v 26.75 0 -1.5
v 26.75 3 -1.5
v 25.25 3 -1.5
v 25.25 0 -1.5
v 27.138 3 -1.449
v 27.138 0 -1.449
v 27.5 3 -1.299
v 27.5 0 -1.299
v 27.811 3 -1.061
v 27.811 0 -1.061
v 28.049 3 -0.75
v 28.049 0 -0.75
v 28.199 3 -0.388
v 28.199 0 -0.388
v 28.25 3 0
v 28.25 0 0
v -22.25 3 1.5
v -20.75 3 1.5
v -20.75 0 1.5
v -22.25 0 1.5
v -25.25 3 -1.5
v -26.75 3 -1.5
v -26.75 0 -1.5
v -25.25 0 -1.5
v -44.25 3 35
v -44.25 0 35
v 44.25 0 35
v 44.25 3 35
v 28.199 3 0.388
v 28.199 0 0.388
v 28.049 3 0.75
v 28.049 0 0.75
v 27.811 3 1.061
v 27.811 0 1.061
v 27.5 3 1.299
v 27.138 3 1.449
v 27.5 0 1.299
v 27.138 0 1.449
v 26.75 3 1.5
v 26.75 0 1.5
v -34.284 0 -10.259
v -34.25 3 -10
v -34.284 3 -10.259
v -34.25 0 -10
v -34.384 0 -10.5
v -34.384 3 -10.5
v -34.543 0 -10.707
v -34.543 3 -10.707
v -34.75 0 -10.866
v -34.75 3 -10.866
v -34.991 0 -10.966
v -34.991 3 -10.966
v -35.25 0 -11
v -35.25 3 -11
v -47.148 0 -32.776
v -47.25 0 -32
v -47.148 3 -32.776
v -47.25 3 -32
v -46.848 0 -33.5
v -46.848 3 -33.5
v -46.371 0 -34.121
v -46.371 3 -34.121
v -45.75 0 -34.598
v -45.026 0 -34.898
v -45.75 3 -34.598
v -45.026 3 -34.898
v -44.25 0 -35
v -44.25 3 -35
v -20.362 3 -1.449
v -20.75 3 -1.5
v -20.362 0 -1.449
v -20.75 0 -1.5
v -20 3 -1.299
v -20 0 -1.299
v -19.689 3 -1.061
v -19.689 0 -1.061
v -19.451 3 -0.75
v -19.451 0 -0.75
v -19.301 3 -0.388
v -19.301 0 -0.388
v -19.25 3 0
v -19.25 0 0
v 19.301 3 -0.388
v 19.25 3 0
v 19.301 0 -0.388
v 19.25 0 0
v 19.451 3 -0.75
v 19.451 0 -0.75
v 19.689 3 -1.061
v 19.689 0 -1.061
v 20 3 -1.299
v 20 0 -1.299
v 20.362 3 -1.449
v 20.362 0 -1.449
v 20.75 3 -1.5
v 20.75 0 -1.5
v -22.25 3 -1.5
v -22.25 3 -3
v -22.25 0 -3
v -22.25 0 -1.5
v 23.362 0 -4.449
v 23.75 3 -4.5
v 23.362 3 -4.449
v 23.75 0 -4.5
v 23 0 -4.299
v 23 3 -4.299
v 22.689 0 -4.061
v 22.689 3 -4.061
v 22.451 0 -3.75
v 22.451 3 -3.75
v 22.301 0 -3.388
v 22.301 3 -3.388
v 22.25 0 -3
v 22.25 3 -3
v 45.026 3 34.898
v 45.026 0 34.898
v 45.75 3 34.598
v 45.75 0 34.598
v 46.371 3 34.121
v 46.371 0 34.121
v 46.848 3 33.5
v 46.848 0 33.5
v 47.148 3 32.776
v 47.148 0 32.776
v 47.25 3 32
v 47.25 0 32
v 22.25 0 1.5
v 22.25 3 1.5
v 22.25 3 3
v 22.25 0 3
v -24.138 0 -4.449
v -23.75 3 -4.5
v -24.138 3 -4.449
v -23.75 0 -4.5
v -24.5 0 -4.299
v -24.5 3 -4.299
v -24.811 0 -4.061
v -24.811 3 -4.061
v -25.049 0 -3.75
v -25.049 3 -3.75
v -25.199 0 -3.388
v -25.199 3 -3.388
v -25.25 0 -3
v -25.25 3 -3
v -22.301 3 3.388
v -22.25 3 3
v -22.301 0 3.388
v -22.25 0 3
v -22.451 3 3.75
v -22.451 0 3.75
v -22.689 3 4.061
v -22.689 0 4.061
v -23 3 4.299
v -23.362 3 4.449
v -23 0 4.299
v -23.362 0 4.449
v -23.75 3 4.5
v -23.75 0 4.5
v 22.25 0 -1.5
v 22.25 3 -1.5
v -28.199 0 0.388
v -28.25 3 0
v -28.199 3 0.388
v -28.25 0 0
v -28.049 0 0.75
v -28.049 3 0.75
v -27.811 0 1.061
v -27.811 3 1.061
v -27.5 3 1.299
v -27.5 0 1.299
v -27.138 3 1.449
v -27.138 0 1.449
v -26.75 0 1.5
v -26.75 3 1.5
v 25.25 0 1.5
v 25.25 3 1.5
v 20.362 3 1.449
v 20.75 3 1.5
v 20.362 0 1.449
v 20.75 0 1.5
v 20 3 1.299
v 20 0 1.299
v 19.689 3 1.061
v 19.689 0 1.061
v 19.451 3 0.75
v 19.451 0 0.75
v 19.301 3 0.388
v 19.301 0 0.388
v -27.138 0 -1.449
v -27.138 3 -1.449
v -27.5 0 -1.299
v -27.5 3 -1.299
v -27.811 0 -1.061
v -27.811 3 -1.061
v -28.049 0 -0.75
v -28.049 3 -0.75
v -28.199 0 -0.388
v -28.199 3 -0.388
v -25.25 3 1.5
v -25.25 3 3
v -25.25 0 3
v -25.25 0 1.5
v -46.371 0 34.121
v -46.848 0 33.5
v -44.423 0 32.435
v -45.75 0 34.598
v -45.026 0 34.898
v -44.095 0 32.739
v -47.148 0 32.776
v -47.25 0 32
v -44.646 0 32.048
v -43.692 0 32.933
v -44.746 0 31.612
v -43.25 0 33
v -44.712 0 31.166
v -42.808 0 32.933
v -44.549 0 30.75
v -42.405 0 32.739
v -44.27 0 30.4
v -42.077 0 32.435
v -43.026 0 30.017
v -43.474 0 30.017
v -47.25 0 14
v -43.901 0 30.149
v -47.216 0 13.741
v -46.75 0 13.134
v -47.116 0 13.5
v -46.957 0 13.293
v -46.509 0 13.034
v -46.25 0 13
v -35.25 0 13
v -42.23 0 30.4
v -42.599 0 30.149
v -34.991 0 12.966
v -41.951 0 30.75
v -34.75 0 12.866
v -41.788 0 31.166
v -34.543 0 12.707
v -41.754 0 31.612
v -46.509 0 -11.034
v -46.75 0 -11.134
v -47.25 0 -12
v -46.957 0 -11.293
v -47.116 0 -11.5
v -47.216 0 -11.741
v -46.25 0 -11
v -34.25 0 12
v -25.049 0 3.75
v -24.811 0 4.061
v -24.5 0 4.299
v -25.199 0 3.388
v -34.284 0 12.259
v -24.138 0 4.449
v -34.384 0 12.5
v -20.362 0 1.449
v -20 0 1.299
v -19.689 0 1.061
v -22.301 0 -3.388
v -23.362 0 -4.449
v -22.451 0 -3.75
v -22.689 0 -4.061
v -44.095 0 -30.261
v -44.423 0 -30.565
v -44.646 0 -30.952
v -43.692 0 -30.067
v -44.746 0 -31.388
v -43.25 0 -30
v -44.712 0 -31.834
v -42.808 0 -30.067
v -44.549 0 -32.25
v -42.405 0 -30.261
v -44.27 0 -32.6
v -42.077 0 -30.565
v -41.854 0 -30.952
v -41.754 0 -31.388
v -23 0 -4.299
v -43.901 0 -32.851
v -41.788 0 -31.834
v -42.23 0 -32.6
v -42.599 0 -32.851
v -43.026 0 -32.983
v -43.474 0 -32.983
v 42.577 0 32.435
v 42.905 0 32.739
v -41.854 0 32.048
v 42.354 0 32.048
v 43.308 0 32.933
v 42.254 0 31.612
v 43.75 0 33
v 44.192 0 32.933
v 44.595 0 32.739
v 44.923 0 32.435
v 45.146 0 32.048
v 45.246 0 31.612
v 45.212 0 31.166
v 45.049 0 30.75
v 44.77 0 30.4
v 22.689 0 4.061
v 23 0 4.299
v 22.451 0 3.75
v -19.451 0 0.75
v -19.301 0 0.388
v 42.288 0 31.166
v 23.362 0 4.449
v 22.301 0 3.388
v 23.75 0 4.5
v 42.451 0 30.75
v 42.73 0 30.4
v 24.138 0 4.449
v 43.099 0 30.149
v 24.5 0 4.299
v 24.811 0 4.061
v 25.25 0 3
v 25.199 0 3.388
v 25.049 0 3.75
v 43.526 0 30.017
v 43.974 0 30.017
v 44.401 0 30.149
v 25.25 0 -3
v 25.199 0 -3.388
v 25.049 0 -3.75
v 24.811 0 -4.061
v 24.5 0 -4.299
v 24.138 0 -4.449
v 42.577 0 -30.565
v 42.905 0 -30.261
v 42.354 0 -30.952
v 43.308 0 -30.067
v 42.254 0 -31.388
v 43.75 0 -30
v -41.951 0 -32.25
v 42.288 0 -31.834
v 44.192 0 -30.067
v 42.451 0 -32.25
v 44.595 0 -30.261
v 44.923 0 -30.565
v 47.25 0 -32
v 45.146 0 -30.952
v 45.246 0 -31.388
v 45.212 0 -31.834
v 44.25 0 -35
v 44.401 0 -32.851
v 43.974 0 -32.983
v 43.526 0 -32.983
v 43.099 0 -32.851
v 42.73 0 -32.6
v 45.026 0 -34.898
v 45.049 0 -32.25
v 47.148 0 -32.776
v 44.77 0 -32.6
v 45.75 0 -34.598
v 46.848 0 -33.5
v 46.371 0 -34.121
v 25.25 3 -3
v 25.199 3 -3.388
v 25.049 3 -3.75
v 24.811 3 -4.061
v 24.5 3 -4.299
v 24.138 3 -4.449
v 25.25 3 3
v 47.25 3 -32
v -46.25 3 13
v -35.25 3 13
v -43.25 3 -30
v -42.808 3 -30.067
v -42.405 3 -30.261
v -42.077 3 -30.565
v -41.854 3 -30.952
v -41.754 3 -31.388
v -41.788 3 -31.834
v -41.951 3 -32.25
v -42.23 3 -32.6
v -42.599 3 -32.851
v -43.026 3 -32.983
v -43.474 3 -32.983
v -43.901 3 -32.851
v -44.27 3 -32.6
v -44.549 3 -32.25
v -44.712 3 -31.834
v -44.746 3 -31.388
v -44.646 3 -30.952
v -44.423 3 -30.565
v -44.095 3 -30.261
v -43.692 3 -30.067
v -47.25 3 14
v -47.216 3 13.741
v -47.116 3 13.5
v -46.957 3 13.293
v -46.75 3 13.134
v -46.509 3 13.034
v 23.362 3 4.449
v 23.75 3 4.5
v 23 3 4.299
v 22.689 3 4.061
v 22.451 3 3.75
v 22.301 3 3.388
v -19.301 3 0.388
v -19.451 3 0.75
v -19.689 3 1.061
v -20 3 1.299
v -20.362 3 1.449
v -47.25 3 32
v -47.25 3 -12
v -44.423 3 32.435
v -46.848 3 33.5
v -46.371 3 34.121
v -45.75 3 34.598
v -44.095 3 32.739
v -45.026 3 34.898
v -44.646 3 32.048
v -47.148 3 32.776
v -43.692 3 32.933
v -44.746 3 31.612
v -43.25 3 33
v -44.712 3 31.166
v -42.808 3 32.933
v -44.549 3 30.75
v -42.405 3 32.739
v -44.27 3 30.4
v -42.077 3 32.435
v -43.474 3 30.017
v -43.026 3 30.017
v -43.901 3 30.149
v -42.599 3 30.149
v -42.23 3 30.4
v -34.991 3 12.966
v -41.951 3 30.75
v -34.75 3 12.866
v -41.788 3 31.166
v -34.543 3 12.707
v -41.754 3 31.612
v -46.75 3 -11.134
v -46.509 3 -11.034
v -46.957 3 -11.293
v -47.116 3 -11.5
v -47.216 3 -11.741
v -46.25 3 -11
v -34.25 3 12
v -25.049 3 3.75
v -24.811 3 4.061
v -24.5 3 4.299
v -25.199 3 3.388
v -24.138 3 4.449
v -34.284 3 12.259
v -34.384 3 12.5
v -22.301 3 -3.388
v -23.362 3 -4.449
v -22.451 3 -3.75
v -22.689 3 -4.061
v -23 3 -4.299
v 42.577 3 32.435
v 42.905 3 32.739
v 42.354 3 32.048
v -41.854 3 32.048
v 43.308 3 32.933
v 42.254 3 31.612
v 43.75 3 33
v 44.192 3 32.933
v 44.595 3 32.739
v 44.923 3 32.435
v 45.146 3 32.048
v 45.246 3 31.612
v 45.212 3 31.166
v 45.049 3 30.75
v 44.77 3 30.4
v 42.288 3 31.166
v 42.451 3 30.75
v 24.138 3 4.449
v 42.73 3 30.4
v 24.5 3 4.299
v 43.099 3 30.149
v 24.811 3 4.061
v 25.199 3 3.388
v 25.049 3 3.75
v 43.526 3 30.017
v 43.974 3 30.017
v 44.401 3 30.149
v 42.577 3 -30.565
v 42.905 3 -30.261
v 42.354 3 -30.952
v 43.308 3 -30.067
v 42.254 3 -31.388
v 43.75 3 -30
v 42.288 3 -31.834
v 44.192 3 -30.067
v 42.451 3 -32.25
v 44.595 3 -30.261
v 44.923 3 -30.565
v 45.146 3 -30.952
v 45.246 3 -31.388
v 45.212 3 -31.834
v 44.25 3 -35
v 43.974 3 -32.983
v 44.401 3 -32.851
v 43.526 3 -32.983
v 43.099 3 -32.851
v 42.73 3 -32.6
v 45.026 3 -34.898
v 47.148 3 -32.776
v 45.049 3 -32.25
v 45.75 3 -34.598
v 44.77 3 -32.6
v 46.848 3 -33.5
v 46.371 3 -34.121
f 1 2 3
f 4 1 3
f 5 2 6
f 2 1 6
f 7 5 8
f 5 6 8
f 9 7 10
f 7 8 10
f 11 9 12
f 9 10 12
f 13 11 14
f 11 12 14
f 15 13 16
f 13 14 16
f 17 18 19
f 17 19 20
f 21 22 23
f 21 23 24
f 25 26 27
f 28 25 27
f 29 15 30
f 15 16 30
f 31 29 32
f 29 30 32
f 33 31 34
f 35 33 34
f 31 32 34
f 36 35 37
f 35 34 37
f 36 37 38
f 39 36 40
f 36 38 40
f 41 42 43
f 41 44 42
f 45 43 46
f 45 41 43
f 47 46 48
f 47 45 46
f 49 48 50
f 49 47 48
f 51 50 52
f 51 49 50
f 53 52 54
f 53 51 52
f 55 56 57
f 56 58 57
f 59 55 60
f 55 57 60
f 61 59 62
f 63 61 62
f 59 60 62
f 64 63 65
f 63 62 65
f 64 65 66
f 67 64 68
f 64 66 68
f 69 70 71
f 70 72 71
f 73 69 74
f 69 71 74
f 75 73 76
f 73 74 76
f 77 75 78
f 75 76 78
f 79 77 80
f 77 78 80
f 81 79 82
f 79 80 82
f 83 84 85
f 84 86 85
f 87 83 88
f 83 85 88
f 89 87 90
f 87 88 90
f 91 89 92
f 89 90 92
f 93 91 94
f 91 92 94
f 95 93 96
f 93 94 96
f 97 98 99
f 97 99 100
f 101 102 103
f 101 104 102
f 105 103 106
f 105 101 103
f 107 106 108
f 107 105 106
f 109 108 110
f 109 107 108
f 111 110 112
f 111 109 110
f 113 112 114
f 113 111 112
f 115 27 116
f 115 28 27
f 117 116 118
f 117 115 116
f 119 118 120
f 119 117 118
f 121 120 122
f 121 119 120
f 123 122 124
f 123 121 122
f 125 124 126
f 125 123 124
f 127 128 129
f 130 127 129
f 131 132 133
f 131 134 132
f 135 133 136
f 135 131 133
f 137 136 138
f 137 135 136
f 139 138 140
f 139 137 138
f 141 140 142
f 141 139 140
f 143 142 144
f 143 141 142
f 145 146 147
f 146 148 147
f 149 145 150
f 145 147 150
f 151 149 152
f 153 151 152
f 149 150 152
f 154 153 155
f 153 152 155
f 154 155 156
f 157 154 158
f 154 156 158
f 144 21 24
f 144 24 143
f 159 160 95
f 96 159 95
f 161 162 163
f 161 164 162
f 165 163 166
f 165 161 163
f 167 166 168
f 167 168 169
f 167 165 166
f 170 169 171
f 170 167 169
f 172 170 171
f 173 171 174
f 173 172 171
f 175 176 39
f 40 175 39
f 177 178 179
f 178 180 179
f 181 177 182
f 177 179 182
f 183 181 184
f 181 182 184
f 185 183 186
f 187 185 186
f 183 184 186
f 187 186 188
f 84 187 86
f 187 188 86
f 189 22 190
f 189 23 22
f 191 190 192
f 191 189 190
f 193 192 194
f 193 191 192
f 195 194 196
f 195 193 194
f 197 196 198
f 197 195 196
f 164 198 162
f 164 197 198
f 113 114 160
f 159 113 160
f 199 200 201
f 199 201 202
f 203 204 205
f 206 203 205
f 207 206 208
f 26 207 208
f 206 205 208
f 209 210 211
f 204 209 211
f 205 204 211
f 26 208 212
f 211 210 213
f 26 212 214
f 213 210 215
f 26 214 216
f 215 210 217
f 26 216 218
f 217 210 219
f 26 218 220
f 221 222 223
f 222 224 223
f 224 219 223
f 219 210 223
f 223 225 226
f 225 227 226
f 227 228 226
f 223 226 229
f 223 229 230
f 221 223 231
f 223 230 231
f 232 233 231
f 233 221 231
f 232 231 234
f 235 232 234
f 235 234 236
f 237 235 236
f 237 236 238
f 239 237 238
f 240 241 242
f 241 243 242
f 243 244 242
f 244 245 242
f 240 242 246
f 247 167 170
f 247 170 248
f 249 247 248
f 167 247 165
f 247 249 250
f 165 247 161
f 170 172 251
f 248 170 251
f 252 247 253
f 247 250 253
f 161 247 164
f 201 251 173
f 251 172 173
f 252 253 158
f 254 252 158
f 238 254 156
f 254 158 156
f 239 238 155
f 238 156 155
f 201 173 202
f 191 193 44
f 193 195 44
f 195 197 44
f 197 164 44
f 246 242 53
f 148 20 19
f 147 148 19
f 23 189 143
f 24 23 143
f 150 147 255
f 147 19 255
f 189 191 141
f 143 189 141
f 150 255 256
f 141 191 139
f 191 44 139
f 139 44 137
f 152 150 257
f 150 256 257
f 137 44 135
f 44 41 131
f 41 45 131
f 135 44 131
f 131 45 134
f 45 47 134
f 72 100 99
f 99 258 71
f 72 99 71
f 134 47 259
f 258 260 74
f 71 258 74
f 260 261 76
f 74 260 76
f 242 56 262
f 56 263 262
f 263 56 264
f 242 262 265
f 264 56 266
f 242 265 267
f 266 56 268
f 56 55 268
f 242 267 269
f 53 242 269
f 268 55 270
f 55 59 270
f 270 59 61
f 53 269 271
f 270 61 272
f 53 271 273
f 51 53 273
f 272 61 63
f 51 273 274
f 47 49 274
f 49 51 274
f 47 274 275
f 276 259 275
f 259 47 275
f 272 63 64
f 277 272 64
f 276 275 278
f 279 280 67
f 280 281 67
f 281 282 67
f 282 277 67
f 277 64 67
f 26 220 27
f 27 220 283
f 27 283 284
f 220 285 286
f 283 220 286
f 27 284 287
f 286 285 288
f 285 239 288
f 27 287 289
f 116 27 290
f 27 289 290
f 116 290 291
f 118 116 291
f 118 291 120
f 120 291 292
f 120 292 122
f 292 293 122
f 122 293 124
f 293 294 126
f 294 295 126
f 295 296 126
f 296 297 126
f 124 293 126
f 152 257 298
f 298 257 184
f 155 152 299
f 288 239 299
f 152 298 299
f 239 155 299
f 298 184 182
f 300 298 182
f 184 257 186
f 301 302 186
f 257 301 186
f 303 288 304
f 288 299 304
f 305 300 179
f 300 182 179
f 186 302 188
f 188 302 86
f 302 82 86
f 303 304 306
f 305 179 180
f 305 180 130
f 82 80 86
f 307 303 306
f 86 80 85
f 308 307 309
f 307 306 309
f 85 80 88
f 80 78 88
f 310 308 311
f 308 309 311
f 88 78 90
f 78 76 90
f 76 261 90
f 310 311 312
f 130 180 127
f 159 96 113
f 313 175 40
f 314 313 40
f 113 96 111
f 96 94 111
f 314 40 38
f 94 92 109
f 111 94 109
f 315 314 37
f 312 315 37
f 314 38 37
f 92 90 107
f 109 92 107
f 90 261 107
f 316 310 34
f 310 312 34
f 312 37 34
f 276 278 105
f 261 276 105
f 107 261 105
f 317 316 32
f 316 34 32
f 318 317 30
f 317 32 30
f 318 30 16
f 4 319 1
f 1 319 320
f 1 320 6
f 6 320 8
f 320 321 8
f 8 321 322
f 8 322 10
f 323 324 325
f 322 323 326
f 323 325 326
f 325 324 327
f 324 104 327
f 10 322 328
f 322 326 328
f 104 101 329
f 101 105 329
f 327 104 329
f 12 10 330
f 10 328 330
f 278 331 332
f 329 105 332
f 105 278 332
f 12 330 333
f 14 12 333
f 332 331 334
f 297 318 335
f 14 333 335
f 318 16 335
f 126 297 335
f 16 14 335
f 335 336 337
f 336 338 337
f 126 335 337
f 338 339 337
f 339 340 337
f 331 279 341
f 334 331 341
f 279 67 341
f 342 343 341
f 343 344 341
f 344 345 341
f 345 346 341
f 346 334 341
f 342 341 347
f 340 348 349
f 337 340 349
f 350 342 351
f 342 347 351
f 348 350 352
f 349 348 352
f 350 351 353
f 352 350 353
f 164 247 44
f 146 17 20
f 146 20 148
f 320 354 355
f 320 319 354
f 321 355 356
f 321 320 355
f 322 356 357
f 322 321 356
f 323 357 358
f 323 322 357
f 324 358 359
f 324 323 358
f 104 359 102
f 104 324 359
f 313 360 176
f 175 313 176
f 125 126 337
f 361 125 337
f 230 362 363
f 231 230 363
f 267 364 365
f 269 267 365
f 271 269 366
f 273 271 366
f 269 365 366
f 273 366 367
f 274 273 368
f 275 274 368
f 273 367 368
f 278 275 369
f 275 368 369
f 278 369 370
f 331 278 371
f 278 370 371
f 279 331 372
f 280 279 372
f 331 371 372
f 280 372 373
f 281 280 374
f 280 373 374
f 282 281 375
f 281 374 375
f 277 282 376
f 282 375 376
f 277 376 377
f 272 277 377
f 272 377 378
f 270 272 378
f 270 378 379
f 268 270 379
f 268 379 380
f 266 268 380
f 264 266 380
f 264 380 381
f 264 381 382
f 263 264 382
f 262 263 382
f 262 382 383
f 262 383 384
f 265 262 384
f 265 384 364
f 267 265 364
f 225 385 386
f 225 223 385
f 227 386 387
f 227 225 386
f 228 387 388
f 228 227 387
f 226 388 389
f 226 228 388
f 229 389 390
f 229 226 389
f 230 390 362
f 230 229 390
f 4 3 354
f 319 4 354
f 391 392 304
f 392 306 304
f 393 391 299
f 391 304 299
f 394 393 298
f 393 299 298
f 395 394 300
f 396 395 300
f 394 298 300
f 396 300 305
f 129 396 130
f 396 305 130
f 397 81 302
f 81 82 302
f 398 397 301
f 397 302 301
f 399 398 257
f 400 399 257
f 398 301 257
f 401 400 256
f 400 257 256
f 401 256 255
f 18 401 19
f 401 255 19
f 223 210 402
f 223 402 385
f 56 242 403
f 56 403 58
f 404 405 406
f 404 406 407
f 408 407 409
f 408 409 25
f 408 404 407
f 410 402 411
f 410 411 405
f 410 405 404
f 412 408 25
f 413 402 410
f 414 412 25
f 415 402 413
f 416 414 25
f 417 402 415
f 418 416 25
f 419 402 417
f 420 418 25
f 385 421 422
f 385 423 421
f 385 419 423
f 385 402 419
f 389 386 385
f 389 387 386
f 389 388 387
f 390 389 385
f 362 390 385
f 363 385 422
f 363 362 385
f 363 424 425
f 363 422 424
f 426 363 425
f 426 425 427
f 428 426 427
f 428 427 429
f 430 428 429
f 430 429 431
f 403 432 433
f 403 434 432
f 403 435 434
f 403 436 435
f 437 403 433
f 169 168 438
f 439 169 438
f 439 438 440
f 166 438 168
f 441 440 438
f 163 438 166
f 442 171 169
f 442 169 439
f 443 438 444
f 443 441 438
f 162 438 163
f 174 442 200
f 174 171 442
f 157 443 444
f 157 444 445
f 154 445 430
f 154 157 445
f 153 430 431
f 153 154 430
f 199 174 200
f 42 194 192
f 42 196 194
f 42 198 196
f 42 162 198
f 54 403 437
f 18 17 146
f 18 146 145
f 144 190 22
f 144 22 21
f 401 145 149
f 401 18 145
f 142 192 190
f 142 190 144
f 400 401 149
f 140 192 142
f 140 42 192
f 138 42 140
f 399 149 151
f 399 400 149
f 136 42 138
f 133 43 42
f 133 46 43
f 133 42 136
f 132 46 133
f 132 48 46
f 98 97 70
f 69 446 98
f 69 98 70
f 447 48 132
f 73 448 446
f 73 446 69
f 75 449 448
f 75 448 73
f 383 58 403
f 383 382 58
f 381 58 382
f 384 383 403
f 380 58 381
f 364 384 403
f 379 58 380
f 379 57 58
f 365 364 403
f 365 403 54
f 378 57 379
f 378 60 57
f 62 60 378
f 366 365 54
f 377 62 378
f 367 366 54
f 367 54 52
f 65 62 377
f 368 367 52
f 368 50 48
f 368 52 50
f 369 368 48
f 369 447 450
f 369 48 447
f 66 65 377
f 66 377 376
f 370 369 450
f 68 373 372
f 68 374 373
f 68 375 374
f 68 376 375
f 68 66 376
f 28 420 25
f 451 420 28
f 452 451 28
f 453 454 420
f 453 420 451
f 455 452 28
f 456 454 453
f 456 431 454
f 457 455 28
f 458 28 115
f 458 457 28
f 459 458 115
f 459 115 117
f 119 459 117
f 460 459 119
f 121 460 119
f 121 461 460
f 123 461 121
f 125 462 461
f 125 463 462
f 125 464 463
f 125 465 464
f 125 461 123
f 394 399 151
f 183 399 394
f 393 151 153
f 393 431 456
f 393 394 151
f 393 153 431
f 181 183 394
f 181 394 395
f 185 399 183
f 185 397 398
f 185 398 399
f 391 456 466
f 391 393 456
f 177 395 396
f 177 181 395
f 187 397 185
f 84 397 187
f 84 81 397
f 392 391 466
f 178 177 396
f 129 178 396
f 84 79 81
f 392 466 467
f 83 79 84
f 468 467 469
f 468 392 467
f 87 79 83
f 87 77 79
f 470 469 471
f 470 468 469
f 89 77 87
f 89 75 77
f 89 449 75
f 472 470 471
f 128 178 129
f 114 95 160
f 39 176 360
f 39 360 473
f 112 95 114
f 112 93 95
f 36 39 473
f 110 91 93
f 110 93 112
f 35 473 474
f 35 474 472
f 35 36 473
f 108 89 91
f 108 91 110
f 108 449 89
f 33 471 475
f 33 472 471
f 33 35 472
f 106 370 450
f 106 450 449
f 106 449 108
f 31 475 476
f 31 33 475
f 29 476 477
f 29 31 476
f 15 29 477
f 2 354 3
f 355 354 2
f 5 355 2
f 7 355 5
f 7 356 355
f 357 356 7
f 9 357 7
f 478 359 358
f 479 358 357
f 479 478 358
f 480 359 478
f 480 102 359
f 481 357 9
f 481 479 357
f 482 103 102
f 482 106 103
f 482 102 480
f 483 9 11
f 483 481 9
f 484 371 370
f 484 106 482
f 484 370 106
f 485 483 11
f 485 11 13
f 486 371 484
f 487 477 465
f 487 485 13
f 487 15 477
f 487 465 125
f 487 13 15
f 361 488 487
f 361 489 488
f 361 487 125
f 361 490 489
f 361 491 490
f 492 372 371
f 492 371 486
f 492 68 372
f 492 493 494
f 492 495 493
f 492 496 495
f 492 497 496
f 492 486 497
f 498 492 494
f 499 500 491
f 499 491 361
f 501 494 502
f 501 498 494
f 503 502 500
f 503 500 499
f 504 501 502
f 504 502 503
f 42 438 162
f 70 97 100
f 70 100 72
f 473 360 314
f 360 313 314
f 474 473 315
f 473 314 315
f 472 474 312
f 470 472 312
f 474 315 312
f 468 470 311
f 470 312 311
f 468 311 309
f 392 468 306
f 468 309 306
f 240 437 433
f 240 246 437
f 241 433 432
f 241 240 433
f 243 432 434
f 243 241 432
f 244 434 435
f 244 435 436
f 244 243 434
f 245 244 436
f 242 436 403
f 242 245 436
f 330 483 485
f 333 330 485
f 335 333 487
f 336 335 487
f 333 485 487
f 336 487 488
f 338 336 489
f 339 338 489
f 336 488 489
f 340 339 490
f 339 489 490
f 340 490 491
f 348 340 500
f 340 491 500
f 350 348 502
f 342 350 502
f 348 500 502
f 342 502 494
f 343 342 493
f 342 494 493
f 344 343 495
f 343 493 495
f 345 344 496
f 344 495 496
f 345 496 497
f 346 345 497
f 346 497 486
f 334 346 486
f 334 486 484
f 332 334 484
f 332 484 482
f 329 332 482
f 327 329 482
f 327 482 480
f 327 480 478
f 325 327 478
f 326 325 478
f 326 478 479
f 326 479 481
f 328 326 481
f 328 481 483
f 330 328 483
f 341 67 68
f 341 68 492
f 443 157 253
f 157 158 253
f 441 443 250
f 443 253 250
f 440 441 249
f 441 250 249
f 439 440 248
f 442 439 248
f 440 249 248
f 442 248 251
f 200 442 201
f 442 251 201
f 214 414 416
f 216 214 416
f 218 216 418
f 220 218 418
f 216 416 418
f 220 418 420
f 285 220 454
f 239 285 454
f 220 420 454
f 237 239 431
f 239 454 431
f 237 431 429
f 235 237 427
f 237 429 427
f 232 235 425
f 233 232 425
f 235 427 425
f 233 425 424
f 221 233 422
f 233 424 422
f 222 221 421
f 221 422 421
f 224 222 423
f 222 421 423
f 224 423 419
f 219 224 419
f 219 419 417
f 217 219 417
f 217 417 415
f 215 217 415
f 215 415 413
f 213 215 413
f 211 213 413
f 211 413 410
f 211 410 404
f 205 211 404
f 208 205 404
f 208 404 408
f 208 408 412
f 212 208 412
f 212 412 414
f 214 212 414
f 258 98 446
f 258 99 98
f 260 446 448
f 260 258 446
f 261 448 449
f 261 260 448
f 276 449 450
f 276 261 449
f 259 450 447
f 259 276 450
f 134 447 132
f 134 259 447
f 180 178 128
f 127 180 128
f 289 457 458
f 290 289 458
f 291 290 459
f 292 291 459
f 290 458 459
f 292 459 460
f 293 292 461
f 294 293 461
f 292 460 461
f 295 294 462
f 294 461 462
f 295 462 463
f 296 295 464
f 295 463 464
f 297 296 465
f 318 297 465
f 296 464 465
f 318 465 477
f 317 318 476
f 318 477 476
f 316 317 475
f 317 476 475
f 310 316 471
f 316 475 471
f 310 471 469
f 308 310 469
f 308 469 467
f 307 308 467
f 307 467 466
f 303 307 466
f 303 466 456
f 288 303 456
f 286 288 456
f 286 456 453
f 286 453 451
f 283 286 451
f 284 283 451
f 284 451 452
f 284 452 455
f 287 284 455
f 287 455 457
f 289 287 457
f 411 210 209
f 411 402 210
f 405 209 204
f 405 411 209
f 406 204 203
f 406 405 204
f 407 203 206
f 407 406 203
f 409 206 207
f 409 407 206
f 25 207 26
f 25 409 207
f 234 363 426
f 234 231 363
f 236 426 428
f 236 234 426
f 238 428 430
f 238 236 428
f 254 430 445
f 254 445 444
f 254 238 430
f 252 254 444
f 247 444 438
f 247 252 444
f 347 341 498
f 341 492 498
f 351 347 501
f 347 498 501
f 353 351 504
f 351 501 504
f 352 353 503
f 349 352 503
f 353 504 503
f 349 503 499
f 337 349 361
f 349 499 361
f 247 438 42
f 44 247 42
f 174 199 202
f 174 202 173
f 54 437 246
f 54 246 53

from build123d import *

# Parameters (mm, degrees)
SKETCH1_W           = 94.5
SKETCH1_H           = 70
BOSS_EXTRUDE1_DEPTH = 3
SKETCH3_R           = 1.5
CUT_EXTRUDE2_DEPTH  = 59.877521177
FILLET2_R           = 3
SKETCH5_W           = 13
SKETCH5_H           = 24
CUT_EXTRUDE3_DEPTH  = 59.877521177
FILLET3_R           = 1
FILLET5_R           = 1.5
FILLET6_R           = 1.5
FILLET7_R           = 1.5
FILLET8_R           = 1.5
FILLET9_R           = 1.5
FILLET10_R          = 1.5
FILLET11_R          = 1.5
FILLET12_R          = 1.5


with BuildPart() as part:
    # Sketch1 → Boss-Extrude1 (new body)
    with BuildSketch(Plane(origin=(0, 0, 0), x_dir=(1, 0, 0), z_dir=(0, 1, 0))):
        Rectangle(SKETCH1_W, SKETCH1_H)
    extrude(amount=BOSS_EXTRUDE1_DEPTH)

    # Sketch3 → Cut-Extrude2 (cut, through all)
    with BuildSketch(Plane(origin=(0, 3, 0), x_dir=(1, 0, 0), z_dir=(0, 1, 0))):
        with Locations(Location((43.75, 31.5, 0), (0, 0, 270))):
            Circle(SKETCH3_R)
        with Locations(Location((-43.25, 31.5, 0), (0, 0, 270))):
            Circle(SKETCH3_R)
        with Locations(Location((-43.25, -31.5, 0), (0, 0, 270))):
            Circle(SKETCH3_R)
        with Locations(Location((43.75, -31.5, 0), (0, 0, 270))):
            Circle(SKETCH3_R)
    extrude(amount=-CUT_EXTRUDE2_DEPTH, mode=Mode.SUBTRACT)

    # Fillet2
    fillet2_edges = [part.edges().sort_by_distance(p)[0] for p in [
        (47.25, 1.5, 35),
        (-47.25, 1.5, 35),
        (-47.25, 1.5, -35),
        (47.25, 1.5, -35),
    ]]
    fillet(fillet2_edges, radius=FILLET2_R)

    # Sketch5 → Cut-Extrude3 (cut, through all)
    with BuildSketch(Plane(origin=(0, 3, 0), x_dir=(1, 0, 0), z_dir=(0, 1, 0))):
        with Locations((-40.75, -1)):
            Rectangle(SKETCH5_W, SKETCH5_H)
        Polygon((-25.25, 1.5), (-25.25, 4.5), (-22.25, 4.5), (-22.25, 1.5), (-19.25, 1.5), (-19.25, -1.5), (-22.25, -1.5), (-22.25, -4.5), (-25.25, -4.5), (-25.25, -1.5), (-28.25, -1.5), (-28.25, 1.5), align=None)
        Polygon((25.25, 1.5), (25.25, 4.5), (22.25, 4.5), (22.25, 1.5), (19.25, 1.5), (19.25, -1.5), (22.25, -1.5), (22.25, -4.5), (25.25, -4.5), (25.25, -1.5), (28.25, -1.5), (28.25, 1.5), align=None)
    extrude(amount=-CUT_EXTRUDE3_DEPTH, mode=Mode.SUBTRACT)

    # Fillet3
    fillet3_edges = [part.edges().sort_by_distance(p)[0] for p in [
        (-34.25, 1.5, 13),
        (-47.25, 1.5, 13),
        (-47.25, 1.5, -11),
        (-34.25, 1.5, -11),
    ]]
    fillet(fillet3_edges, radius=FILLET3_R)

    # Fillet5
    fillet5_edges = [part.edges().sort_by_distance(p)[0] for p in [
        (-25.25, 1.5, -4.5),
        (-22.25, 1.5, -4.5),
    ]]
    fillet(fillet5_edges, radius=FILLET5_R - 0.0001)  # a hair under: the kernel refuses the full size

    # Fillet6
    fillet6_edges = [part.edges().sort_by_distance(p)[0] for p in [
        (-28.25, 1.5, 1.5),
        (-28.25, 1.5, -1.5),
    ]]
    fillet(fillet6_edges, radius=FILLET6_R - 0.0001)  # a hair under: the kernel refuses the full size

    # Fillet7
    fillet7_edges = [part.edges().sort_by_distance(p)[0] for p in [
        (-19.25, 1.5, -1.5),
        (-19.25, 1.5, 1.5),
    ]]
    fillet(fillet7_edges, radius=FILLET7_R - 0.0001)  # a hair under: the kernel refuses the full size

    # Fillet8
    fillet8_edges = [part.edges().sort_by_distance(p)[0] for p in [
        (-22.25, 1.5, 4.5),
        (-25.25, 1.5, 4.5),
    ]]
    fillet(fillet8_edges, radius=FILLET8_R - 0.0001)  # a hair under: the kernel refuses the full size

    # Fillet9
    fillet9_edges = [part.edges().sort_by_distance(p)[0] for p in [
        (25.25, 1.5, -4.5),
        (22.25, 1.5, -4.5),
    ]]
    fillet(fillet9_edges, radius=FILLET9_R - 0.0001)  # a hair under: the kernel refuses the full size

    # Fillet10
    fillet10_edges = [part.edges().sort_by_distance(p)[0] for p in [
        (28.25, 1.5, -1.5),
        (28.25, 1.5, 1.5),
    ]]
    fillet(fillet10_edges, radius=FILLET10_R - 0.0001)  # a hair under: the kernel refuses the full size

    # Fillet11
    fillet11_edges = [part.edges().sort_by_distance(p)[0] for p in [
        (25.25, 1.5, 4.5),
        (22.25, 1.5, 4.5),
    ]]
    fillet(fillet11_edges, radius=FILLET11_R - 0.0001)  # a hair under: the kernel refuses the full size

    # Fillet12
    fillet12_edges = [part.edges().sort_by_distance(p)[0] for p in [
        (19.25, 1.5, 1.5),
        (19.25, 1.5, -1.5),
    ]]
    fillet(fillet12_edges, radius=FILLET12_R - 0.0001)  # a hair under: the kernel refuses the full size


solid = part.part
